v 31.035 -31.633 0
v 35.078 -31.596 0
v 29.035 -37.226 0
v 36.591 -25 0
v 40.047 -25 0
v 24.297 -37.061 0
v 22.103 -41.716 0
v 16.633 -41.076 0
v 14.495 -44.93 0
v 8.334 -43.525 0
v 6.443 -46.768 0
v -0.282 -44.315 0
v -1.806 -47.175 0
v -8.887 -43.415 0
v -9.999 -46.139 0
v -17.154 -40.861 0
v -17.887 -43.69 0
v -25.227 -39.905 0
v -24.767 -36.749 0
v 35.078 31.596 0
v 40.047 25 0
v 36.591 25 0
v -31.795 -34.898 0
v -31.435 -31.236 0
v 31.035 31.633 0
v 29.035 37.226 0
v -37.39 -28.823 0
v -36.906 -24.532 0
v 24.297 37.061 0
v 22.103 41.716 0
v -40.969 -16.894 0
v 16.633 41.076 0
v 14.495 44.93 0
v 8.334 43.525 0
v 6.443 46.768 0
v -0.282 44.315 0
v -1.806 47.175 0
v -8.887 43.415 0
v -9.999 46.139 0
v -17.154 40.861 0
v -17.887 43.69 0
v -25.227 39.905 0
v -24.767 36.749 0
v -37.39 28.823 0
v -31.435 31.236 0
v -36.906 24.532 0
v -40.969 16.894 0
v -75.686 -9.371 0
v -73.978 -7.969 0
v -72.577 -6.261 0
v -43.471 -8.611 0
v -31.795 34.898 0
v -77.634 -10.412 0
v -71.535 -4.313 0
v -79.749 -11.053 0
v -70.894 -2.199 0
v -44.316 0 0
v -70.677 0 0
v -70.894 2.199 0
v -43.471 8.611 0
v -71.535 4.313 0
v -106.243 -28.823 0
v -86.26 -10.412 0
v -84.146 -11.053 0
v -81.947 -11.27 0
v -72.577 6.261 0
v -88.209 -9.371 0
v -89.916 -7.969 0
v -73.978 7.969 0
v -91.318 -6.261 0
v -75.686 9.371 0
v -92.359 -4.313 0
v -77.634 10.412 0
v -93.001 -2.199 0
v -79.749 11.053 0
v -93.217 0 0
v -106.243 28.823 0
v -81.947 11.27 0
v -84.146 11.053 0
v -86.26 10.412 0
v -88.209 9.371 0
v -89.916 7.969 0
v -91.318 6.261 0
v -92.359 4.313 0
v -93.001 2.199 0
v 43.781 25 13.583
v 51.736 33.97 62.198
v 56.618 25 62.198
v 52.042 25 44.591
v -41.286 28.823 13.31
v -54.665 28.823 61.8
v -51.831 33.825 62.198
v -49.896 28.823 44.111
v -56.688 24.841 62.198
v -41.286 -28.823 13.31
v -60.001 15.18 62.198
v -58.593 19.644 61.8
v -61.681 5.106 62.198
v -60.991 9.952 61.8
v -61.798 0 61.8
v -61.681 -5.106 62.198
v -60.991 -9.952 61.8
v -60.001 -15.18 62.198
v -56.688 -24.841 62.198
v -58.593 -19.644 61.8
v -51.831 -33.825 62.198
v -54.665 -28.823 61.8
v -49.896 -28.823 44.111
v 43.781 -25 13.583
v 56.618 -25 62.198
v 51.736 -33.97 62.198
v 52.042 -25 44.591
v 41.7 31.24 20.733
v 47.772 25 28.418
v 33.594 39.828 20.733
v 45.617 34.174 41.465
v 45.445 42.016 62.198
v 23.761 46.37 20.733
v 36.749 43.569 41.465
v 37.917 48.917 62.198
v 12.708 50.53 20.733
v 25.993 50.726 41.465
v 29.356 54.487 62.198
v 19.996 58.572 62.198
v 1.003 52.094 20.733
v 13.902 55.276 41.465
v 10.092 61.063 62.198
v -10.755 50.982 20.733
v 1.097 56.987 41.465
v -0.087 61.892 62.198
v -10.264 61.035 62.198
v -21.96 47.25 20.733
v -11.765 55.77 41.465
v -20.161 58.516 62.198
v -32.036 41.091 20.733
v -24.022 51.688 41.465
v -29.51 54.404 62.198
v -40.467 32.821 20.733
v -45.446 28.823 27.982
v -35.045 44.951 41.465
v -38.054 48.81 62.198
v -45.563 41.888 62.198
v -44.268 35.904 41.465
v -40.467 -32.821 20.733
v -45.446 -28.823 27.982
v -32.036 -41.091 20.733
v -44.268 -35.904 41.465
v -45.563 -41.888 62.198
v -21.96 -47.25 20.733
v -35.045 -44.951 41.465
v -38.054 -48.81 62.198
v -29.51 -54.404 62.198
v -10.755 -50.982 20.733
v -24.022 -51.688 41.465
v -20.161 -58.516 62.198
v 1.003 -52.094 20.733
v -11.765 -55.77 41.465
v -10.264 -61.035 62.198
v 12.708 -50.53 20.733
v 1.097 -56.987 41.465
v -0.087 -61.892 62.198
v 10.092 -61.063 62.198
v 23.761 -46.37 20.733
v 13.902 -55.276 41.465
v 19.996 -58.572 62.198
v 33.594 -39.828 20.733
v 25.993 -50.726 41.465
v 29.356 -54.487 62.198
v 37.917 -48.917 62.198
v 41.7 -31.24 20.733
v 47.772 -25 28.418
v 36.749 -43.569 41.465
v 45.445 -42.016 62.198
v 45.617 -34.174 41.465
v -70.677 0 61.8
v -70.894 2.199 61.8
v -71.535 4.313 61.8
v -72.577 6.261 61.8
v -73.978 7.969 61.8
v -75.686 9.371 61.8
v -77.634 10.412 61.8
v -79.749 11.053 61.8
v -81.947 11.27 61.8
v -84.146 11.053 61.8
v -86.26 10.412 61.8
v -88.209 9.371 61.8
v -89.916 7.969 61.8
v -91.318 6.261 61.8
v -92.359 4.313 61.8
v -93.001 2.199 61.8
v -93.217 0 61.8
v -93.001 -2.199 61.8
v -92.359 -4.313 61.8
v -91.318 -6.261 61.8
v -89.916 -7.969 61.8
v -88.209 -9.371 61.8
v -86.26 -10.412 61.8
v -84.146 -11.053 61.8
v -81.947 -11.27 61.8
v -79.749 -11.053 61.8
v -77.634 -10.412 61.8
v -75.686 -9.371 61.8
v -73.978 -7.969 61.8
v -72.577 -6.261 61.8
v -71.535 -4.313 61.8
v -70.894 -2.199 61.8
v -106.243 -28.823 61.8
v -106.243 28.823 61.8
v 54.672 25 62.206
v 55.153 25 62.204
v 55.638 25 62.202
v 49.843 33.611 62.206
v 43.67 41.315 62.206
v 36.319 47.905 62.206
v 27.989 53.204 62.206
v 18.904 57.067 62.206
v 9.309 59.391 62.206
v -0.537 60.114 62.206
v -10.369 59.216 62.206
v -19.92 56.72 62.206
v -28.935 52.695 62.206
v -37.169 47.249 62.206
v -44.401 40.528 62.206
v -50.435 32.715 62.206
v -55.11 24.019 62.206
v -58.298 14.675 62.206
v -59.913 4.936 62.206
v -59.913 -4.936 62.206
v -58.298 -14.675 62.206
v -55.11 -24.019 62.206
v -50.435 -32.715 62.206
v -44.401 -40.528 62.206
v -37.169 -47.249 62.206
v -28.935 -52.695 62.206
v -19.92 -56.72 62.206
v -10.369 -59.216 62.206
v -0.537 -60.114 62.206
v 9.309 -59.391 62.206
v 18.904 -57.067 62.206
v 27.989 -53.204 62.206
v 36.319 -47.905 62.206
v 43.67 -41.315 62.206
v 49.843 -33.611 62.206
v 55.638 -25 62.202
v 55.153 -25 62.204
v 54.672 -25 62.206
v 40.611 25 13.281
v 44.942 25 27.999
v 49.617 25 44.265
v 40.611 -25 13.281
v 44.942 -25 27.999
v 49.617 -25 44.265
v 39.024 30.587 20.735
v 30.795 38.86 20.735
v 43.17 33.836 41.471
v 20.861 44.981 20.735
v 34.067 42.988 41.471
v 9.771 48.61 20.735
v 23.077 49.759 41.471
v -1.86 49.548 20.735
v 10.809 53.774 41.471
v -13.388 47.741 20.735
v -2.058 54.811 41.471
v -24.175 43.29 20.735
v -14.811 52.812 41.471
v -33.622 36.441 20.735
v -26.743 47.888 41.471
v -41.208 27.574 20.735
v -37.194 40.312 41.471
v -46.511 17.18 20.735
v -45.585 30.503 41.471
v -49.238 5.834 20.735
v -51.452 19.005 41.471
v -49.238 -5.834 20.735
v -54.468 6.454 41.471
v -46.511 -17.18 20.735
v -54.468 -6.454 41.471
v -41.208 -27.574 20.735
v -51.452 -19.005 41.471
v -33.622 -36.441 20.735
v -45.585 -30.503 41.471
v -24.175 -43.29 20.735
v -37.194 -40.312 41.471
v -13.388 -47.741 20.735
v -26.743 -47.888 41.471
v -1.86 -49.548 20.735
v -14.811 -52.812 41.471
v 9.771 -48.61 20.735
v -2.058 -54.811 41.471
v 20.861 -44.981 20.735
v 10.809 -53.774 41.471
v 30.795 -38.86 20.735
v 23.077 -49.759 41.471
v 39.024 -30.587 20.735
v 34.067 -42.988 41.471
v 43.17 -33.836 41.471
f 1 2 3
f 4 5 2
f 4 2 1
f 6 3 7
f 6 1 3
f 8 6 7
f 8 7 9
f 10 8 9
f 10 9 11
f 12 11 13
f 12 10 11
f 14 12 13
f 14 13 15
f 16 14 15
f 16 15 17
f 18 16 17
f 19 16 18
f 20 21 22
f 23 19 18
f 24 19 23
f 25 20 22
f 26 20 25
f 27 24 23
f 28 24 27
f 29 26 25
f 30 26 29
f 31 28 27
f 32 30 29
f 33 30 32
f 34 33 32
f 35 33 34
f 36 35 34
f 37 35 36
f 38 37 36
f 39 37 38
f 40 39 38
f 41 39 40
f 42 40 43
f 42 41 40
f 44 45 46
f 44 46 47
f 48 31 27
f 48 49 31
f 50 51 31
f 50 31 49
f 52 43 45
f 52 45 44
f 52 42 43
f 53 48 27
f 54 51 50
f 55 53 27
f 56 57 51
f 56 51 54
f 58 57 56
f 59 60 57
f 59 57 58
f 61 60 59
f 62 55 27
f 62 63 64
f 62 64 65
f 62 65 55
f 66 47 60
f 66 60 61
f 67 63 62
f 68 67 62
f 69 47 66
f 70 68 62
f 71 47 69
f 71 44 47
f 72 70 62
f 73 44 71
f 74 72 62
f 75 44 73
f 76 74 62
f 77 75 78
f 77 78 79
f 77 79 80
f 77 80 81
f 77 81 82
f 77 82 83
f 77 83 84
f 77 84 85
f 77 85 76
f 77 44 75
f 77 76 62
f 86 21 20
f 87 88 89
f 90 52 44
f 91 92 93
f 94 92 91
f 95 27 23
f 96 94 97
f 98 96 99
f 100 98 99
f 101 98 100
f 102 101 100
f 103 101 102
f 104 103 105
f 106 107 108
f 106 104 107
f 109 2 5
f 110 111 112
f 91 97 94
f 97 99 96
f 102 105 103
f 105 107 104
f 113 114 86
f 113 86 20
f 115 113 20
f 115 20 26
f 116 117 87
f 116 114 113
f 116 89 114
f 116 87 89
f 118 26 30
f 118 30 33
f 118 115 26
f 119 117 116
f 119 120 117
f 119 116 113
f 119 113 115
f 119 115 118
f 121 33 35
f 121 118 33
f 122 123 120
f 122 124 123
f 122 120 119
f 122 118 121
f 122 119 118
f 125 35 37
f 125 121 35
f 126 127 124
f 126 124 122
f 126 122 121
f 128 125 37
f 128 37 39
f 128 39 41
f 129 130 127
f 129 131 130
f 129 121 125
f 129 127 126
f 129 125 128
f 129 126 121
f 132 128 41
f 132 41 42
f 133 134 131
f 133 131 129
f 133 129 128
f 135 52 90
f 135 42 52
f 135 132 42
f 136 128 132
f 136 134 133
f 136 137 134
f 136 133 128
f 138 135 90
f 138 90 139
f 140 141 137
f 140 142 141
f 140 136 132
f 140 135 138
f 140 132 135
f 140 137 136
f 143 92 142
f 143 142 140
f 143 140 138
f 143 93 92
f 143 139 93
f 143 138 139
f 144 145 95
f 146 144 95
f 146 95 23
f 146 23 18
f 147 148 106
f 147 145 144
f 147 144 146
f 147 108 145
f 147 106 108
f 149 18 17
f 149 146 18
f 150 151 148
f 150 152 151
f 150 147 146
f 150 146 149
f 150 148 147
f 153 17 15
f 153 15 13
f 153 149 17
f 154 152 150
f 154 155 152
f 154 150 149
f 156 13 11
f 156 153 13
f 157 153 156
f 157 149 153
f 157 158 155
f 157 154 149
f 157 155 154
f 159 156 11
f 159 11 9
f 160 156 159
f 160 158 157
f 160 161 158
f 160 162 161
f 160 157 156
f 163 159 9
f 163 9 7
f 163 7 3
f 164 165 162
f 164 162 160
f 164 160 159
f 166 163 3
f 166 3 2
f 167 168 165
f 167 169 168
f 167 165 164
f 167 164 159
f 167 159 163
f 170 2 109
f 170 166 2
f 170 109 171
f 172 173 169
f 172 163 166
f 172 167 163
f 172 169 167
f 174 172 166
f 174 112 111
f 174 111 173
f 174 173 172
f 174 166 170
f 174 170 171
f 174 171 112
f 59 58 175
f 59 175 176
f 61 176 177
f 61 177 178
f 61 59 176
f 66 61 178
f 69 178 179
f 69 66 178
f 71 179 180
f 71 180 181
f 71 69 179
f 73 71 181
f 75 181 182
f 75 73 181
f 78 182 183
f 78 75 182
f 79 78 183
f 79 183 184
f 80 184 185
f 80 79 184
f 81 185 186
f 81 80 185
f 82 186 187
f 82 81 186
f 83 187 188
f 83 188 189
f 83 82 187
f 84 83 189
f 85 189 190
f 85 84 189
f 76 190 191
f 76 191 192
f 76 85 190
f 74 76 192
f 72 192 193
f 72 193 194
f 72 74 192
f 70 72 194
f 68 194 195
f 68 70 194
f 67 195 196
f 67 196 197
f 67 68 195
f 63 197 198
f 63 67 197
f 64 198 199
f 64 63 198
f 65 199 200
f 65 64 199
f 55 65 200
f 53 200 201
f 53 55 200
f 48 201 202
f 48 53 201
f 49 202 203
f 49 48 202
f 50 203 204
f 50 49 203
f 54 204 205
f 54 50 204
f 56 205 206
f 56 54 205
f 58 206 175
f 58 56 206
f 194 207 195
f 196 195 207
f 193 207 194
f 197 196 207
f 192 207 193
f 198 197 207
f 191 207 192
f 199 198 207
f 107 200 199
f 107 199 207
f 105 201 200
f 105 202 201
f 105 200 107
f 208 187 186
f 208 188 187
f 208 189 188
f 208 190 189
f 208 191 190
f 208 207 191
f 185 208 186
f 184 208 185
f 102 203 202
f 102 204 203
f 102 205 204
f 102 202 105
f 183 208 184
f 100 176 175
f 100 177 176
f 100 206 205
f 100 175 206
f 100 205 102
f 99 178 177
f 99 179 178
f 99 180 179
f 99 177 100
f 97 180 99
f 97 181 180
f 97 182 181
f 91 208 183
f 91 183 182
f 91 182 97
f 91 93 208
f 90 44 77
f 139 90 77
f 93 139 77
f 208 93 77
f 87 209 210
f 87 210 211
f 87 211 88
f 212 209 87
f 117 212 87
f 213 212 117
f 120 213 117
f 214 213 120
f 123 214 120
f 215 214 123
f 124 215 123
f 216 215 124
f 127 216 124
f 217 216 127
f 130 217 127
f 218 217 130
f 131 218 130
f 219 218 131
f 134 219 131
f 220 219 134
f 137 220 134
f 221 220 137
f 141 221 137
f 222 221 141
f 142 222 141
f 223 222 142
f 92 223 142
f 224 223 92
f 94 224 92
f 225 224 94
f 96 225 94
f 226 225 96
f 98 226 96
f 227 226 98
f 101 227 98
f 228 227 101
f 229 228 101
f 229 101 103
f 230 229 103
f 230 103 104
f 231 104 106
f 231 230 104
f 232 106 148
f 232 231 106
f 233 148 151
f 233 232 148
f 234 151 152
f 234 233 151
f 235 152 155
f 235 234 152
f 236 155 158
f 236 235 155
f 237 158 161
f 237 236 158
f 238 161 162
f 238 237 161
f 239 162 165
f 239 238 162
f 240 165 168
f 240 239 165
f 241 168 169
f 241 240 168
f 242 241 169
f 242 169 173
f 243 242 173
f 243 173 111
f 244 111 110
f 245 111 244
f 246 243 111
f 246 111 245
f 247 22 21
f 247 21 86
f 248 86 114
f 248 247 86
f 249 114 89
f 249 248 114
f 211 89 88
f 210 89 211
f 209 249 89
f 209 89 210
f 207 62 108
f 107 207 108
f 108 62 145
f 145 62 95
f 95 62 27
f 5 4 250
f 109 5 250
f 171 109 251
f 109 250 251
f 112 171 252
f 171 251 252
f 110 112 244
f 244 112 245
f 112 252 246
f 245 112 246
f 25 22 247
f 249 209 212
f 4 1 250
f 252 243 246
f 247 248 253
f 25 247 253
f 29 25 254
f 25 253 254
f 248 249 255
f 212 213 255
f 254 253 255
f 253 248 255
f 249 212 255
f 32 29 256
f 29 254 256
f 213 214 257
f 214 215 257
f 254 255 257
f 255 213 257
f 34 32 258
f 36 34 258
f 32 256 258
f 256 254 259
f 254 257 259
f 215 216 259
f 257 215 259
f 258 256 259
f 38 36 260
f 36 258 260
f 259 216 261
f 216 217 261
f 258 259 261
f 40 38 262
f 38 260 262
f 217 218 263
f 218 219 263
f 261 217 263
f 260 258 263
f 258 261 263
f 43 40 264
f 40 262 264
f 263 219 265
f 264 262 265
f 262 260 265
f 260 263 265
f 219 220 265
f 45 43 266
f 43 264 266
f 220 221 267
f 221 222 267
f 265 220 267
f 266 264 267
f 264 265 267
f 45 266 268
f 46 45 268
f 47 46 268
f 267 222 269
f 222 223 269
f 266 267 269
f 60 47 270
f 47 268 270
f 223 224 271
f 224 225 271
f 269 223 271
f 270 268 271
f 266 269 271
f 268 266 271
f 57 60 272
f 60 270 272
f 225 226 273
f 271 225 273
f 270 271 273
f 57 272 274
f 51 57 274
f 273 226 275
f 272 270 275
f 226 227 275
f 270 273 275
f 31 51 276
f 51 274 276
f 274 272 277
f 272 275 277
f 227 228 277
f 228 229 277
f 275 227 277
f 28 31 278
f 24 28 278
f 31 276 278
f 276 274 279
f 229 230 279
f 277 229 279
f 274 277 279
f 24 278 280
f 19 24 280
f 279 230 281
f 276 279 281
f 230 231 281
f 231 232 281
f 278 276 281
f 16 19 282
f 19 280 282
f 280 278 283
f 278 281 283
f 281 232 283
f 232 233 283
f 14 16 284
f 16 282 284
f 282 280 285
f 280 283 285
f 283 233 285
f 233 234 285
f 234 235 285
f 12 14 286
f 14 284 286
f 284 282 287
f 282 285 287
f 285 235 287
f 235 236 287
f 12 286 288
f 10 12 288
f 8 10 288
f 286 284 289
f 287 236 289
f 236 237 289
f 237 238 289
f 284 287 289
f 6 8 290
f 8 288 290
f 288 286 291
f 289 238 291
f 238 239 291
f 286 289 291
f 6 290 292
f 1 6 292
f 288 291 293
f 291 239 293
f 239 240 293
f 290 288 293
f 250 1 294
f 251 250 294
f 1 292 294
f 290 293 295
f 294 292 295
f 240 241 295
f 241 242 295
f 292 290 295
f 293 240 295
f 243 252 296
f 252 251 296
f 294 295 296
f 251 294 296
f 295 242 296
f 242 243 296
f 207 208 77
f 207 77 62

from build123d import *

# Parameters (mm, degrees)
F3_W     = 50
F3_H     = 76.046514
F4_DEPTH = 61.9
F5_R     = 11.27
F6_DEPTH = 61.8


with BuildPart() as f1:
    # F0 (on Front) → F1 (revolve)
    with BuildSketch(Plane.XZ):
        Polygon((47.209889, 0), (61.891673, 62.197552), (0, 62.49862), (0, 0), align=None)
    revolve(axis=Axis((0, 0, 31.24931), (0, 0, 1)))

    # F3 (on offset) → F4 (cut)
    with BuildSketch(Plane.YZ.offset(29)):
        with Locations((0, 28.95349)):
            Rectangle(F3_W, F3_H)
    extrude(amount=F4_DEPTH, mode=Mode.SUBTRACT)

    # F5 (on Top) → F6 (join)
    with BuildSketch(Plane.XY):
        with BuildLine():
            Line((-27.737366, 28.822735), (-106.242556, 28.822735))
            Line((-106.242556, 28.822735), (-106.242556, -28.822735))
            Line((-106.242556, -28.822735), (-28.702144, -28.822735))
            ThreePointArc((-28.702144, -28.822735), (-40.032989, 0.197711), (-27.737366, 28.822735))
        make_face()
        with Locations((-81.947307, 0)):
            Circle(F5_R, mode=Mode.SUBTRACT)
    extrude(amount=F6_DEPTH)

    # F7 (on Front) → F8 (revolve, cut)
    with BuildSketch(Plane.XZ):
        Polygon((0, 62.710572), (0, 0), (44.315554, 0), (60.244557, 62.710572), align=None)
    revolve(axis=Axis((0, 0, 31.355286), (0, 0, 1)), mode=Mode.SUBTRACT)


solid = f1.part
